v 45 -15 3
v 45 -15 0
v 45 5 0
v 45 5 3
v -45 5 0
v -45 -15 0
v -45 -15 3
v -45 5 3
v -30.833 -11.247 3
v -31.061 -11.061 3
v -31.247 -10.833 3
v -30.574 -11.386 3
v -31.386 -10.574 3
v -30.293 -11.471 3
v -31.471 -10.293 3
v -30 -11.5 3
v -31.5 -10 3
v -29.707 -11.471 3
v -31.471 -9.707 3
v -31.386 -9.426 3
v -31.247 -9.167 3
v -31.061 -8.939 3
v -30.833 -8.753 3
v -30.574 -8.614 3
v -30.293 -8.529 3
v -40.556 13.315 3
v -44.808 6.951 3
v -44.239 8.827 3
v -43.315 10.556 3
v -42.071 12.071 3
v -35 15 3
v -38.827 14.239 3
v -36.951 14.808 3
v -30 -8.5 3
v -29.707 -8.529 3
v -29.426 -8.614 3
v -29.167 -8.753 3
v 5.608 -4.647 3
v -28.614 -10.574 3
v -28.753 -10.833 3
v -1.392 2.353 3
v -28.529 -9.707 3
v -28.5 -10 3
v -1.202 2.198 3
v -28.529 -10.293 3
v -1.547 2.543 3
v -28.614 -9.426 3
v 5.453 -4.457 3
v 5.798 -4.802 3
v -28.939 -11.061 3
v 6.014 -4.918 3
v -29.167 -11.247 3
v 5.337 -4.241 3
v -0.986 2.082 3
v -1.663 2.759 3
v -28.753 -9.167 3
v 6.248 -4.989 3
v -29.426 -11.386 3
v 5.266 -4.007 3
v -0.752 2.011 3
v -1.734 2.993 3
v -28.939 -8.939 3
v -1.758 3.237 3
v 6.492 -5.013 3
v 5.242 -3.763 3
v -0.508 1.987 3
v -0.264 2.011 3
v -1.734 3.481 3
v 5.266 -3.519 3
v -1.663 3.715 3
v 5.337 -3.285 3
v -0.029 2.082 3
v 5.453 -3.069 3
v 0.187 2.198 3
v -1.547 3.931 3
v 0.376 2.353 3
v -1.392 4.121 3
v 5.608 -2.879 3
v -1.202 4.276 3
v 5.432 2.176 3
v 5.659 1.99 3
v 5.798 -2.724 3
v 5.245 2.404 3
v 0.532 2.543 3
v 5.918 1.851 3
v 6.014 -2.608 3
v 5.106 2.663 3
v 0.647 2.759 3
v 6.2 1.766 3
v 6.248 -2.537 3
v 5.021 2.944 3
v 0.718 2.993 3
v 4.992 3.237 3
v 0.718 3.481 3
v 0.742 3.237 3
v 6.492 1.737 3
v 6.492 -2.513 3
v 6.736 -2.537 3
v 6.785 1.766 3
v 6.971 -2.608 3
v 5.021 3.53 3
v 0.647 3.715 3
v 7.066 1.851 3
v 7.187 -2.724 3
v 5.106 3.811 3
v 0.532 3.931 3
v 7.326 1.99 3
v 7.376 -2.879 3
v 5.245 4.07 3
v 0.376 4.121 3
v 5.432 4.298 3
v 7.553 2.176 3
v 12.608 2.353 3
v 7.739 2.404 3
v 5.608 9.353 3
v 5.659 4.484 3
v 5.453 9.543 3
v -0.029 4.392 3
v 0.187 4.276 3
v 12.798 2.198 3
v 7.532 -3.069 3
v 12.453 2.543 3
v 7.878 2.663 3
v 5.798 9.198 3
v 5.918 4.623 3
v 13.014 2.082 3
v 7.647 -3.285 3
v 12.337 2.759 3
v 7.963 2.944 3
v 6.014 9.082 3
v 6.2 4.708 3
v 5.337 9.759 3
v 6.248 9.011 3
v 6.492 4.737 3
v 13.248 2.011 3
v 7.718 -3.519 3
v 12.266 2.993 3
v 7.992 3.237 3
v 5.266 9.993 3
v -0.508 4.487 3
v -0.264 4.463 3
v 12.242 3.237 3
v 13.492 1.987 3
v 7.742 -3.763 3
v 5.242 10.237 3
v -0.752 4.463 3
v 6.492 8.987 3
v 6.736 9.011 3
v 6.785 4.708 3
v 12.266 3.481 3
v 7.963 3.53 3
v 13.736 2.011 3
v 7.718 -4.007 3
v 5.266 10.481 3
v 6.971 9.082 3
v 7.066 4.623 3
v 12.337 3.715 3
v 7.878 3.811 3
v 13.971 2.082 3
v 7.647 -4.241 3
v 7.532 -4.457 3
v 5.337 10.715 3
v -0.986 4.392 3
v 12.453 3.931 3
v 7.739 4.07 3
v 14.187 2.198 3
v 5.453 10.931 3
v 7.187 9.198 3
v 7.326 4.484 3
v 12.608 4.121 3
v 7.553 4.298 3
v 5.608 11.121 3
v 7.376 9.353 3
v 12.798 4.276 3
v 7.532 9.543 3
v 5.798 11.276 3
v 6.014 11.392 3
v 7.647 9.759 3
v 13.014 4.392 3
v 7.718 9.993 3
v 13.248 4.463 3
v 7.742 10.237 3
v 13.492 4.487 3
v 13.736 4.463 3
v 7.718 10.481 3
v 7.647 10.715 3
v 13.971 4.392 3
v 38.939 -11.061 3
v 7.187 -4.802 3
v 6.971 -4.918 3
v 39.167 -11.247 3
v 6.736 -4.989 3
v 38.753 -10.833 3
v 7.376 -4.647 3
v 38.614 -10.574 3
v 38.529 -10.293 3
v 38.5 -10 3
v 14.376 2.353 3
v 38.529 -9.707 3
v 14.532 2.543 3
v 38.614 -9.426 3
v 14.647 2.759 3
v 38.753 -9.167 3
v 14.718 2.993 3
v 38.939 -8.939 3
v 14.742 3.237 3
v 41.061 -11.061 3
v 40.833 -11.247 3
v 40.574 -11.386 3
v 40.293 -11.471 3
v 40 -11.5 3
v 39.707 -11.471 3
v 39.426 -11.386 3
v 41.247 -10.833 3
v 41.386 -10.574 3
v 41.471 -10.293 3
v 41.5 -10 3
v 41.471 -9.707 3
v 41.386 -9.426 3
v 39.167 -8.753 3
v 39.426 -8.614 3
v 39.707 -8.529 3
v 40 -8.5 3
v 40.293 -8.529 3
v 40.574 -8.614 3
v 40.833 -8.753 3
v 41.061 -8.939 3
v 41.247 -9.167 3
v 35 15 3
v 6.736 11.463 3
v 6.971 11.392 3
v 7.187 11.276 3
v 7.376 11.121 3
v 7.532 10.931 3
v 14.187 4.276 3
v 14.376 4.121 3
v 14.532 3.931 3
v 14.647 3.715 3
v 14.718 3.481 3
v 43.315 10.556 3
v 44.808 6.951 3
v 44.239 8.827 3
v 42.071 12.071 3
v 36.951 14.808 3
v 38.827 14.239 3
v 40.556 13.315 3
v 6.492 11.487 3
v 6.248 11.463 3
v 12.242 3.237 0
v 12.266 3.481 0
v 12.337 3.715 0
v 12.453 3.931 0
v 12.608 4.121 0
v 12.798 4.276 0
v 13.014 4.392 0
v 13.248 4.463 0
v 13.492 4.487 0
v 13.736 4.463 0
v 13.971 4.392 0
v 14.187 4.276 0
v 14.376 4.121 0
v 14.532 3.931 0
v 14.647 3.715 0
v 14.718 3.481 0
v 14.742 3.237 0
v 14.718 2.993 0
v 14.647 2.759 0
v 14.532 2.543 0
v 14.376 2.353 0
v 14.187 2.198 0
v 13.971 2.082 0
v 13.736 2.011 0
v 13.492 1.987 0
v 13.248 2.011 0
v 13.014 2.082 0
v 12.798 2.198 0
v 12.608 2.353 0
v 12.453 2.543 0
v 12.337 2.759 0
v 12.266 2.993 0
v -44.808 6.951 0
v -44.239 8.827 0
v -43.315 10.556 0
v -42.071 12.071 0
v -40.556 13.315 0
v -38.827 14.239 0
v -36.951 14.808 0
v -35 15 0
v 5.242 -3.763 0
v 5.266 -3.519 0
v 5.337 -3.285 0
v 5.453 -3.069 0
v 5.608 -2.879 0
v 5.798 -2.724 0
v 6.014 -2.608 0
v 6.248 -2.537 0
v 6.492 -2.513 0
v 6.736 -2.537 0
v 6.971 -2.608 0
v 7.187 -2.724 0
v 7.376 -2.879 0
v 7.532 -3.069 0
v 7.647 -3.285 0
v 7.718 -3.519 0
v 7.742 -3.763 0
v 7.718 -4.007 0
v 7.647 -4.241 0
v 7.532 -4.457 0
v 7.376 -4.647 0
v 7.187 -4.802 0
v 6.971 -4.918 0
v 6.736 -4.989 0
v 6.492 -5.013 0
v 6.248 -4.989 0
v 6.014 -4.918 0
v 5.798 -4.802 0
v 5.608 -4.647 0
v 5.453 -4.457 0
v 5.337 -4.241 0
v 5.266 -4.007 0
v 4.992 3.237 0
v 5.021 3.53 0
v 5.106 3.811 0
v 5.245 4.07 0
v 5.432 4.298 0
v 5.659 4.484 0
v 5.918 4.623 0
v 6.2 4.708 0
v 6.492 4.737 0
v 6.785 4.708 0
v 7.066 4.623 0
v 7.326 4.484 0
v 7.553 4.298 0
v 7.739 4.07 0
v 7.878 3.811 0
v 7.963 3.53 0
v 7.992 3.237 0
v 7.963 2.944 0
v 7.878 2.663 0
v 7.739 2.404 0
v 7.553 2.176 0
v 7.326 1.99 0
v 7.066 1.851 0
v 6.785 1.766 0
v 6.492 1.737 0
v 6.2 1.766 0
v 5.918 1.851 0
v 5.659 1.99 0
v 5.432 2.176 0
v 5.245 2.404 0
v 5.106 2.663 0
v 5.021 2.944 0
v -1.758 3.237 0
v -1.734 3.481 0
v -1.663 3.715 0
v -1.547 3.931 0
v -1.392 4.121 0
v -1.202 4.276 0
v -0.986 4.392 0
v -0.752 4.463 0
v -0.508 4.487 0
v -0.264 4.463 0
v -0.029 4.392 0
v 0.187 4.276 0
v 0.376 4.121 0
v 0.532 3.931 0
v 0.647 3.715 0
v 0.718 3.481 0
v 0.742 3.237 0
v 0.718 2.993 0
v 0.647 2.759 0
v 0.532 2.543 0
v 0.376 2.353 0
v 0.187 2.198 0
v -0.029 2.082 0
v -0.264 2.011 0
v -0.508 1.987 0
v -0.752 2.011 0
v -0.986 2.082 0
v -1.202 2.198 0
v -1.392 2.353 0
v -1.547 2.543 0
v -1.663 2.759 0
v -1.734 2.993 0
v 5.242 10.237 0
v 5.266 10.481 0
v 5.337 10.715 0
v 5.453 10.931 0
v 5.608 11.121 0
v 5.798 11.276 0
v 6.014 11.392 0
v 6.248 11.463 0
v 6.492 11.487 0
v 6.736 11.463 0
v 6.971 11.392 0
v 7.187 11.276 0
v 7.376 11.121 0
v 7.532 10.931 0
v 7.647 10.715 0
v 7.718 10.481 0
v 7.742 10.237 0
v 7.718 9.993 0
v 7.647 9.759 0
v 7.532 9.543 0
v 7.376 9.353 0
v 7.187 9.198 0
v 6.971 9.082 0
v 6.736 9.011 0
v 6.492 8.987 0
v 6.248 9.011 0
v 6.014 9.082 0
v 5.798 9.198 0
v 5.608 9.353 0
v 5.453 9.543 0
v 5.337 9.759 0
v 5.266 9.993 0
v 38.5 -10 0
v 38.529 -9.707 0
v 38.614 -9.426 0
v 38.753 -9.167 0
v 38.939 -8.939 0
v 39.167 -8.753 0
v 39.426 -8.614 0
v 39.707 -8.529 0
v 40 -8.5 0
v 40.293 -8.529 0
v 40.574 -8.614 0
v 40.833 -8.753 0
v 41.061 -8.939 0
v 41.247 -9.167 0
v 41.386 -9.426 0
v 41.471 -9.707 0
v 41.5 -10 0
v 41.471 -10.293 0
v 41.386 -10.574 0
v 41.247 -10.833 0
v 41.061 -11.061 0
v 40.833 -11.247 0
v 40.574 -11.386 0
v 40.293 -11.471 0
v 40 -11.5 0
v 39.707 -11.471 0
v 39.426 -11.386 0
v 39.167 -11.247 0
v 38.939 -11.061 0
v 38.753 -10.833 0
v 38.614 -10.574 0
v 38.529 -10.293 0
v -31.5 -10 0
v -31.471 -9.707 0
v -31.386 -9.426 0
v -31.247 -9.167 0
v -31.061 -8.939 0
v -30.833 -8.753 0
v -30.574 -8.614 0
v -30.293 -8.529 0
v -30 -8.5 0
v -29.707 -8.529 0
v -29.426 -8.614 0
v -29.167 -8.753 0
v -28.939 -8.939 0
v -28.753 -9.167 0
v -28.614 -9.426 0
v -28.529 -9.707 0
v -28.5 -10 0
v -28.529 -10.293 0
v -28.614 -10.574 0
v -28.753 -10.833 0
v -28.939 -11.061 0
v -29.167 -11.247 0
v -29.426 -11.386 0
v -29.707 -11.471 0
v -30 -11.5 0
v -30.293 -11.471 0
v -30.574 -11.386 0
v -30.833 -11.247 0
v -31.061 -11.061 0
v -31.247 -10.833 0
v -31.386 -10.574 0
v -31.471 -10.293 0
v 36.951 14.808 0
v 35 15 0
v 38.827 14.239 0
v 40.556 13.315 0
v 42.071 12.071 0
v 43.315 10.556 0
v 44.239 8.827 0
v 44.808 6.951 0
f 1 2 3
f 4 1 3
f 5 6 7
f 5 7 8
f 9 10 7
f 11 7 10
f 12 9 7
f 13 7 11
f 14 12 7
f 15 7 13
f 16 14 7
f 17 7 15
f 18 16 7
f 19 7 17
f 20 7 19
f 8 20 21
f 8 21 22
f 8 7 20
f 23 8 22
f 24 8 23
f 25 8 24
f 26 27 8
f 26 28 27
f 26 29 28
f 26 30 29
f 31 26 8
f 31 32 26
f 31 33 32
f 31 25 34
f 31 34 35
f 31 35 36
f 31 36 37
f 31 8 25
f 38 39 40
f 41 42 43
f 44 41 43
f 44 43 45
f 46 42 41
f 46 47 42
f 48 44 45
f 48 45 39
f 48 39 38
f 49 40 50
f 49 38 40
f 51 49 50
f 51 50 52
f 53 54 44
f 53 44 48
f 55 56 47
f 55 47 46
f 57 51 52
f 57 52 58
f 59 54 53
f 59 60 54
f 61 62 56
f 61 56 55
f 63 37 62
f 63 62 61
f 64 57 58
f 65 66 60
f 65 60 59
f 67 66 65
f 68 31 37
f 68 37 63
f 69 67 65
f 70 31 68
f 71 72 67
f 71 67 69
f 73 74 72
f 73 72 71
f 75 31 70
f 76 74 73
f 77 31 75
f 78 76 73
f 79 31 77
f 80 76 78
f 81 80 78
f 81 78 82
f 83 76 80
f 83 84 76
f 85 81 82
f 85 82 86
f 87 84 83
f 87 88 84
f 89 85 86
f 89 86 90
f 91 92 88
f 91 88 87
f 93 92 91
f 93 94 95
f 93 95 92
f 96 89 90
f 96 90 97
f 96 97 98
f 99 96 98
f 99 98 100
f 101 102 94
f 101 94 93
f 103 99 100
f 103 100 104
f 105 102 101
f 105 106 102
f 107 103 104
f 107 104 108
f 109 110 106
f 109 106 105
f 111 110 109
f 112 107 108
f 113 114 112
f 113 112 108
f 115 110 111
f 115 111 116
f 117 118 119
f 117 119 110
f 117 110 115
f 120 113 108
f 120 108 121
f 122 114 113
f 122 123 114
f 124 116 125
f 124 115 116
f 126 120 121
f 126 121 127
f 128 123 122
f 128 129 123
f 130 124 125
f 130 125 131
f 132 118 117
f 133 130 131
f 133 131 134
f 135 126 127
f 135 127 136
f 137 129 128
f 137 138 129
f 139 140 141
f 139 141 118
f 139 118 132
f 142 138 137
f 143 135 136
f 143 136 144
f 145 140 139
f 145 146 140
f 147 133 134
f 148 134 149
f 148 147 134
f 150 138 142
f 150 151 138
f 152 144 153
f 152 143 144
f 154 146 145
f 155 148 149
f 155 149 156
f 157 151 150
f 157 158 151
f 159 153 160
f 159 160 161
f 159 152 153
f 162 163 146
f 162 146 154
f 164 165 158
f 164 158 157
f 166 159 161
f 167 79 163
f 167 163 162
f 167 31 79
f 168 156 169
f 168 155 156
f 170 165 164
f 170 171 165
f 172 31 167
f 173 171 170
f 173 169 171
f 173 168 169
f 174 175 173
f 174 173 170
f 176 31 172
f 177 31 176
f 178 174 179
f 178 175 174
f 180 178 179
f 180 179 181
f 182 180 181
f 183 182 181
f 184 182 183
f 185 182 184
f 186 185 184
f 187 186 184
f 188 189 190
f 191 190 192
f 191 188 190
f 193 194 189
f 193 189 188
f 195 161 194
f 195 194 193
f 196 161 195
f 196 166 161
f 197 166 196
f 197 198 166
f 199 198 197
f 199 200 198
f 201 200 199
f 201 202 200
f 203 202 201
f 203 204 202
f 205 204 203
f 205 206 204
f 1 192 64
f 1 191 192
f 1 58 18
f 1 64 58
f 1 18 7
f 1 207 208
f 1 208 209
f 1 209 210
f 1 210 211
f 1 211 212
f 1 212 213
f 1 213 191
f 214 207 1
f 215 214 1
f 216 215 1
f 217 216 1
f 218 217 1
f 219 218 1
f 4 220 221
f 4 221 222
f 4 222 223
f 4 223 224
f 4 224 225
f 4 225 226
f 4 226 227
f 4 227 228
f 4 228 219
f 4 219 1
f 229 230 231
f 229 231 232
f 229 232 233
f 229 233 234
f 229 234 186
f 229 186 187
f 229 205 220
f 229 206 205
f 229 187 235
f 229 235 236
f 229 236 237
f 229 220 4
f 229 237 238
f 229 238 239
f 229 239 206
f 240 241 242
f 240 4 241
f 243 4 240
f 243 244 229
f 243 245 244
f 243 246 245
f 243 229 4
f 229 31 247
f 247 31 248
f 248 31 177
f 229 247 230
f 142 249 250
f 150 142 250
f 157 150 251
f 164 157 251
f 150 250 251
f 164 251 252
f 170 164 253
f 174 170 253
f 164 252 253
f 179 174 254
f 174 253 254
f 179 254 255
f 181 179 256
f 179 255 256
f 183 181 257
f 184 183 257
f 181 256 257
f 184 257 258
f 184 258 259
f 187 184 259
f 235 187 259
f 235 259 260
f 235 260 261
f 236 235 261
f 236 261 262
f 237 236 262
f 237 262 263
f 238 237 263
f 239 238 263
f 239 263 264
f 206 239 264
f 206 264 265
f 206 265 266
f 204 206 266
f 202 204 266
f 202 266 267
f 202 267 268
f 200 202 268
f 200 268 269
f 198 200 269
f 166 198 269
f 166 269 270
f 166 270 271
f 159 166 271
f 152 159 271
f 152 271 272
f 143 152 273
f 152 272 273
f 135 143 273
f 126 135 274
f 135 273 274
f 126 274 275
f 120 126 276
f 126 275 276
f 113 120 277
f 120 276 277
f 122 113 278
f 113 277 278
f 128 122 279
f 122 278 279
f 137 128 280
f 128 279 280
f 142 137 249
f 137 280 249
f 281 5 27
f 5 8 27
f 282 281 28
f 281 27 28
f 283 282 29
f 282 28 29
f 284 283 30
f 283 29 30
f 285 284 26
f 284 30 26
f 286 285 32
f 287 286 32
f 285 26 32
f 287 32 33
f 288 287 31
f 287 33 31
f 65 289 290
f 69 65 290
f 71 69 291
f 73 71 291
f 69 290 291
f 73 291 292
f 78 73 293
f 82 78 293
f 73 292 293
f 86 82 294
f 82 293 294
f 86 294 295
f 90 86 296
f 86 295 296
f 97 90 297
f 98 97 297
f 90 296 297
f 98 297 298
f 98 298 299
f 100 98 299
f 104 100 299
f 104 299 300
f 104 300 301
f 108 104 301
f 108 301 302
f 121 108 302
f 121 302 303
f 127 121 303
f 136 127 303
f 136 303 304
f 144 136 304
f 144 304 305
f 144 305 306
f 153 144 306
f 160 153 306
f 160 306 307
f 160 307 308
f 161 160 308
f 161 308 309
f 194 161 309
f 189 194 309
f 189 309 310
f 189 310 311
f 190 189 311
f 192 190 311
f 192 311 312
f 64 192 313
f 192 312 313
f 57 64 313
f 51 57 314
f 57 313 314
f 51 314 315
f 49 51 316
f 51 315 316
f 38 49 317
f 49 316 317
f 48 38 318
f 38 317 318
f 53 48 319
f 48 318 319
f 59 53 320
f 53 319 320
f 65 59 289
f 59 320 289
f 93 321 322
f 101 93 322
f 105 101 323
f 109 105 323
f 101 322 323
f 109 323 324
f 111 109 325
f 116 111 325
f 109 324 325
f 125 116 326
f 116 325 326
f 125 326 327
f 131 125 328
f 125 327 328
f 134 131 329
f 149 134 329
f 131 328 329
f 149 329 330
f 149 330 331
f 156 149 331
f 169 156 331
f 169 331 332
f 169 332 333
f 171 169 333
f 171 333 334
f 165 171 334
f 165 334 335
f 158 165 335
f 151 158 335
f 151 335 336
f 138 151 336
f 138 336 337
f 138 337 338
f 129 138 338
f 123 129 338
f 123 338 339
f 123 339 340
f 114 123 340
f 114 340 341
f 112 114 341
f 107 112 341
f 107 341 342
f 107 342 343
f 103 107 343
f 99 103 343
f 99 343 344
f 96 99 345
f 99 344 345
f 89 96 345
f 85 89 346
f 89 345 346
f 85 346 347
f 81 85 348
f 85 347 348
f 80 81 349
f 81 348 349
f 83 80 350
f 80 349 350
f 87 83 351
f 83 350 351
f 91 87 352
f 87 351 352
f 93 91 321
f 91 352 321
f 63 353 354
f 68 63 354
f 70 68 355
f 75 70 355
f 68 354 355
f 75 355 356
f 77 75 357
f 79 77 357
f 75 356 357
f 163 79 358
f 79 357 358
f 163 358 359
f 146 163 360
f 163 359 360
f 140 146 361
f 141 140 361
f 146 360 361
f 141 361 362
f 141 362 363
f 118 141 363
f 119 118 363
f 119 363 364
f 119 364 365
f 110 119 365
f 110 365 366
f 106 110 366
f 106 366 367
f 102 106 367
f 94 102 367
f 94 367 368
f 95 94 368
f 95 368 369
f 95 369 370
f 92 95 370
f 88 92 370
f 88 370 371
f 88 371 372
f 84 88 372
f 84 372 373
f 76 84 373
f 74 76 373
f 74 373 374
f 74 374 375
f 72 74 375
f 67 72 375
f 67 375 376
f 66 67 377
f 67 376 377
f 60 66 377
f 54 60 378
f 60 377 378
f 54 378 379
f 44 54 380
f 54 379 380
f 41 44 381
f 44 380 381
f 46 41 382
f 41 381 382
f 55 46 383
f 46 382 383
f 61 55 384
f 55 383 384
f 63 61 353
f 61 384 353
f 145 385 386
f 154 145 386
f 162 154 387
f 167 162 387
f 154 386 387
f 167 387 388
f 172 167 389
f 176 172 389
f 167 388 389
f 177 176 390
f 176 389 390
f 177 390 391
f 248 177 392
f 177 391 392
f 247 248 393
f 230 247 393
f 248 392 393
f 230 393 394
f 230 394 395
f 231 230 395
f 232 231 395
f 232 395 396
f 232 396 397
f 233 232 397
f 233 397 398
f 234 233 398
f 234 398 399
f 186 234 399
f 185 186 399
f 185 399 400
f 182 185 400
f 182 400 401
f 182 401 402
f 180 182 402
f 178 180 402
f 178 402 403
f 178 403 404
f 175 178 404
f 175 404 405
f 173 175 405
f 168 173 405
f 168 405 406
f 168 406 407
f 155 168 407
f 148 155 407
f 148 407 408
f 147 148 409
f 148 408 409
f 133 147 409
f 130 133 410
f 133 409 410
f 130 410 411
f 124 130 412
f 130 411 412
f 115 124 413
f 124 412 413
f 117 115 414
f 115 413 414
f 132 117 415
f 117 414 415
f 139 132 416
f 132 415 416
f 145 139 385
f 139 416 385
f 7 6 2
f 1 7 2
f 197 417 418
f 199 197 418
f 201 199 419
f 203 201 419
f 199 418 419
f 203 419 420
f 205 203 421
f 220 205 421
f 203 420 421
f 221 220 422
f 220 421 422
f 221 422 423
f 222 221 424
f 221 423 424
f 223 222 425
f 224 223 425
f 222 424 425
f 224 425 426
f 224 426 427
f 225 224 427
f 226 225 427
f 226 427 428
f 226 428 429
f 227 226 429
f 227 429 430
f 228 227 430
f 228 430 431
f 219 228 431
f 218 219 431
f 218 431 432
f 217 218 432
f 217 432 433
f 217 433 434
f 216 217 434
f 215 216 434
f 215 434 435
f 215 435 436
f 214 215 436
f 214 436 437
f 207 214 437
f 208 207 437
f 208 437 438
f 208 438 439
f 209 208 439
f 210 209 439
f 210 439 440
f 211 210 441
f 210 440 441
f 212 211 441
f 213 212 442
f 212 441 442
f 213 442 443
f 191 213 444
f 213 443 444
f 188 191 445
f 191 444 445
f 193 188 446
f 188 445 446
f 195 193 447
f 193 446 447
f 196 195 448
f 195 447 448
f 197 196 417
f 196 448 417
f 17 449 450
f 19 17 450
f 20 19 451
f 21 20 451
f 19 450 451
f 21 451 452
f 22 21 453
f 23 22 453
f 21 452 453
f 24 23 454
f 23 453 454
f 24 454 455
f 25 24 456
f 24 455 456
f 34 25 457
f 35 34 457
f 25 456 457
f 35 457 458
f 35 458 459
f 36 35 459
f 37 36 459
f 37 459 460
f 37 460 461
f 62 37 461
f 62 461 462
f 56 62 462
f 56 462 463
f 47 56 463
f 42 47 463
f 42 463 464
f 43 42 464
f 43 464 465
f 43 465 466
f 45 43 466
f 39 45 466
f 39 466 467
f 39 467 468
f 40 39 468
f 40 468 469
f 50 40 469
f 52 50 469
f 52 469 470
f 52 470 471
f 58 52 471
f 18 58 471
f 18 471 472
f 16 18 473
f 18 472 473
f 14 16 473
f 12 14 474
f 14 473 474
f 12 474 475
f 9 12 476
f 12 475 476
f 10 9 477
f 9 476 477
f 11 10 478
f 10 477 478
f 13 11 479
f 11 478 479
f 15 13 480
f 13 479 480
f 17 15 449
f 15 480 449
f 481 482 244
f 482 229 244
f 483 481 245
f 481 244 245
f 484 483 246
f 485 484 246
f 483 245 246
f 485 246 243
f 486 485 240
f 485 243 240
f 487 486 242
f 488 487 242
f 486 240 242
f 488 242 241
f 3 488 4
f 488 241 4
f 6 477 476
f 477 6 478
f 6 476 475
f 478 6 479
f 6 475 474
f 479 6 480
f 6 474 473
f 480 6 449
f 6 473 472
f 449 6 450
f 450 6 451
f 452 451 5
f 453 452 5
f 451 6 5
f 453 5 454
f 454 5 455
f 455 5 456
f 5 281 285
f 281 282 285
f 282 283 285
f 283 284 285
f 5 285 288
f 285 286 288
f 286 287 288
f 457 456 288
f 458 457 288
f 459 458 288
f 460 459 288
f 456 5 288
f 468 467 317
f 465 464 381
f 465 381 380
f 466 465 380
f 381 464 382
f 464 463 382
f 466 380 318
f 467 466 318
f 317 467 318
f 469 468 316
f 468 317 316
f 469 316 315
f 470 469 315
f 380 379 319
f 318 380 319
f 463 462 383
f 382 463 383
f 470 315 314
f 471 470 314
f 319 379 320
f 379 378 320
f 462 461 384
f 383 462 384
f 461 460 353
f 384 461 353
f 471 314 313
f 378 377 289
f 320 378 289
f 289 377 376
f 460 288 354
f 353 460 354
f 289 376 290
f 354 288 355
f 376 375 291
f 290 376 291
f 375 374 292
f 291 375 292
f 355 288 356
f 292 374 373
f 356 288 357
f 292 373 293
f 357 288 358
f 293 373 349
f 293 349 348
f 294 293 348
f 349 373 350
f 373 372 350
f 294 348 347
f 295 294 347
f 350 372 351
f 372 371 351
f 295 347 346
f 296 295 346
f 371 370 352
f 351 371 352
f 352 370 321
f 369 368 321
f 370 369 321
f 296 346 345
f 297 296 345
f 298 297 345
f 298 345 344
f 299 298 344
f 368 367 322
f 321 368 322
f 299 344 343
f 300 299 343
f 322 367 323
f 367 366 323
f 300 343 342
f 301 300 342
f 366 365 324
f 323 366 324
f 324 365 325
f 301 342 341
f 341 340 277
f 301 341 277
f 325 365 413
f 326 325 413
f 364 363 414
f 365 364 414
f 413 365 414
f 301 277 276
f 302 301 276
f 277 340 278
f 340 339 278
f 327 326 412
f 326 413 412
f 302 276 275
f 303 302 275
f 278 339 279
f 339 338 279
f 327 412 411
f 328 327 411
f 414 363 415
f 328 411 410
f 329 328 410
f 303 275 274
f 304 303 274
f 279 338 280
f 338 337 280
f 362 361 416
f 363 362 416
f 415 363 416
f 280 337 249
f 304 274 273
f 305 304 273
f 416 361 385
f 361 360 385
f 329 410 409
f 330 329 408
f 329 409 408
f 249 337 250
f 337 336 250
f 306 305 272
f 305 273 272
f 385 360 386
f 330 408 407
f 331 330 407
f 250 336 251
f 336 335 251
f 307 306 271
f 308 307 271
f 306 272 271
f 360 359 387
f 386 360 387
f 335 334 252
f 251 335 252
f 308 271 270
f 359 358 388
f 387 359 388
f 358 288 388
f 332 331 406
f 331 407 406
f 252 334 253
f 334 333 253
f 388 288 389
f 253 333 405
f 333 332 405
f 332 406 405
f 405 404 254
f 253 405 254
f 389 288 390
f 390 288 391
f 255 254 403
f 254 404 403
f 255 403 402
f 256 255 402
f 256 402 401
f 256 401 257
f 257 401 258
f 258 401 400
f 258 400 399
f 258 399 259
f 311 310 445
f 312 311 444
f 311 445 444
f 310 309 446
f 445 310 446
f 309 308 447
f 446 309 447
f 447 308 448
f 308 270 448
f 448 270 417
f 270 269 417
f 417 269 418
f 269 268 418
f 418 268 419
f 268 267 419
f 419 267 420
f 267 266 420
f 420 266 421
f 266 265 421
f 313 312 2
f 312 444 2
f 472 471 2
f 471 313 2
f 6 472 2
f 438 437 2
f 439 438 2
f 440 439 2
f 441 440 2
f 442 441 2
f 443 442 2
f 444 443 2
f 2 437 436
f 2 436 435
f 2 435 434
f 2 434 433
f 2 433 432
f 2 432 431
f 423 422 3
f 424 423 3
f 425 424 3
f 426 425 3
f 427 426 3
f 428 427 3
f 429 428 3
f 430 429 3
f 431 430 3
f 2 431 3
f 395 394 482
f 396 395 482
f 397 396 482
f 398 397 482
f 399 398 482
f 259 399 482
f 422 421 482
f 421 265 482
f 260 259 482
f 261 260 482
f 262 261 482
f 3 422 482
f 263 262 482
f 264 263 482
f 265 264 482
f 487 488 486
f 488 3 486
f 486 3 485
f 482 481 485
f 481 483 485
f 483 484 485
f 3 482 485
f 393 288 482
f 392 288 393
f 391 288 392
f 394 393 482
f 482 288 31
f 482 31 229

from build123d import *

# Parameters (mm, degrees)
SKETCH_1_W          = 90
SKETCH_1_H          = 30
EXTRUDE_1_DEPTH     = 3
SKETCH_3_R          = 1.5
SKETCH_3_R_2        = 1.25
CUT_EXTRUDE_2_DEPTH = 10
SKETCH_4_R          = 1.5
CUT_EXTRUDE_3_DEPTH = 10
FILLET_1_R          = 10


with BuildPart() as part:
    # 草图1 → 凸台-拉伸1 (new body)
    with BuildSketch(Plane.XY):
        Rectangle(SKETCH_1_W, SKETCH_1_H)
    extrude(amount=EXTRUDE_1_DEPTH)

    # 草图3 → 切除-拉伸2 (cut)
    with BuildSketch(Plane(origin=(0, 0, 0), x_dir=(-1, 0, 0), z_dir=(0, 0, -1))):
        with Locations((-6.49227102, 3.236967106)):
            Circle(SKETCH_3_R)
        with Locations((-13.49227102, 3.236967106)):
            Circle(SKETCH_3_R_2)
        with Locations((-6.49227102, 10.236967106)):
            Circle(SKETCH_3_R_2)
        with Locations((-6.49227102, -3.763032894)):
            Circle(SKETCH_3_R_2)
        with Locations((0.50772898, 3.236967106)):
            Circle(SKETCH_3_R_2)
    extrude(amount=-CUT_EXTRUDE_2_DEPTH, mode=Mode.SUBTRACT)

    # 草图4 → 切除-拉伸3 (cut)
    with BuildSketch(Plane(origin=(0, 0, 0), x_dir=(-1, 0, 0), z_dir=(0, 0, -1))):
        with Locations((-40, -10)):
            Circle(SKETCH_4_R)
        with Locations((30, -10)):
            Circle(SKETCH_4_R)
    extrude(amount=-CUT_EXTRUDE_3_DEPTH, mode=Mode.SUBTRACT)

    # 圆角1
    fillet_1_edges = [part.edges().sort_by_distance(p)[0] for p in [
        (-45, 15, 1.5),
        (45, 15, 1.5),
    ]]
    fillet(fillet_1_edges, radius=FILLET_1_R)


solid = part.part
